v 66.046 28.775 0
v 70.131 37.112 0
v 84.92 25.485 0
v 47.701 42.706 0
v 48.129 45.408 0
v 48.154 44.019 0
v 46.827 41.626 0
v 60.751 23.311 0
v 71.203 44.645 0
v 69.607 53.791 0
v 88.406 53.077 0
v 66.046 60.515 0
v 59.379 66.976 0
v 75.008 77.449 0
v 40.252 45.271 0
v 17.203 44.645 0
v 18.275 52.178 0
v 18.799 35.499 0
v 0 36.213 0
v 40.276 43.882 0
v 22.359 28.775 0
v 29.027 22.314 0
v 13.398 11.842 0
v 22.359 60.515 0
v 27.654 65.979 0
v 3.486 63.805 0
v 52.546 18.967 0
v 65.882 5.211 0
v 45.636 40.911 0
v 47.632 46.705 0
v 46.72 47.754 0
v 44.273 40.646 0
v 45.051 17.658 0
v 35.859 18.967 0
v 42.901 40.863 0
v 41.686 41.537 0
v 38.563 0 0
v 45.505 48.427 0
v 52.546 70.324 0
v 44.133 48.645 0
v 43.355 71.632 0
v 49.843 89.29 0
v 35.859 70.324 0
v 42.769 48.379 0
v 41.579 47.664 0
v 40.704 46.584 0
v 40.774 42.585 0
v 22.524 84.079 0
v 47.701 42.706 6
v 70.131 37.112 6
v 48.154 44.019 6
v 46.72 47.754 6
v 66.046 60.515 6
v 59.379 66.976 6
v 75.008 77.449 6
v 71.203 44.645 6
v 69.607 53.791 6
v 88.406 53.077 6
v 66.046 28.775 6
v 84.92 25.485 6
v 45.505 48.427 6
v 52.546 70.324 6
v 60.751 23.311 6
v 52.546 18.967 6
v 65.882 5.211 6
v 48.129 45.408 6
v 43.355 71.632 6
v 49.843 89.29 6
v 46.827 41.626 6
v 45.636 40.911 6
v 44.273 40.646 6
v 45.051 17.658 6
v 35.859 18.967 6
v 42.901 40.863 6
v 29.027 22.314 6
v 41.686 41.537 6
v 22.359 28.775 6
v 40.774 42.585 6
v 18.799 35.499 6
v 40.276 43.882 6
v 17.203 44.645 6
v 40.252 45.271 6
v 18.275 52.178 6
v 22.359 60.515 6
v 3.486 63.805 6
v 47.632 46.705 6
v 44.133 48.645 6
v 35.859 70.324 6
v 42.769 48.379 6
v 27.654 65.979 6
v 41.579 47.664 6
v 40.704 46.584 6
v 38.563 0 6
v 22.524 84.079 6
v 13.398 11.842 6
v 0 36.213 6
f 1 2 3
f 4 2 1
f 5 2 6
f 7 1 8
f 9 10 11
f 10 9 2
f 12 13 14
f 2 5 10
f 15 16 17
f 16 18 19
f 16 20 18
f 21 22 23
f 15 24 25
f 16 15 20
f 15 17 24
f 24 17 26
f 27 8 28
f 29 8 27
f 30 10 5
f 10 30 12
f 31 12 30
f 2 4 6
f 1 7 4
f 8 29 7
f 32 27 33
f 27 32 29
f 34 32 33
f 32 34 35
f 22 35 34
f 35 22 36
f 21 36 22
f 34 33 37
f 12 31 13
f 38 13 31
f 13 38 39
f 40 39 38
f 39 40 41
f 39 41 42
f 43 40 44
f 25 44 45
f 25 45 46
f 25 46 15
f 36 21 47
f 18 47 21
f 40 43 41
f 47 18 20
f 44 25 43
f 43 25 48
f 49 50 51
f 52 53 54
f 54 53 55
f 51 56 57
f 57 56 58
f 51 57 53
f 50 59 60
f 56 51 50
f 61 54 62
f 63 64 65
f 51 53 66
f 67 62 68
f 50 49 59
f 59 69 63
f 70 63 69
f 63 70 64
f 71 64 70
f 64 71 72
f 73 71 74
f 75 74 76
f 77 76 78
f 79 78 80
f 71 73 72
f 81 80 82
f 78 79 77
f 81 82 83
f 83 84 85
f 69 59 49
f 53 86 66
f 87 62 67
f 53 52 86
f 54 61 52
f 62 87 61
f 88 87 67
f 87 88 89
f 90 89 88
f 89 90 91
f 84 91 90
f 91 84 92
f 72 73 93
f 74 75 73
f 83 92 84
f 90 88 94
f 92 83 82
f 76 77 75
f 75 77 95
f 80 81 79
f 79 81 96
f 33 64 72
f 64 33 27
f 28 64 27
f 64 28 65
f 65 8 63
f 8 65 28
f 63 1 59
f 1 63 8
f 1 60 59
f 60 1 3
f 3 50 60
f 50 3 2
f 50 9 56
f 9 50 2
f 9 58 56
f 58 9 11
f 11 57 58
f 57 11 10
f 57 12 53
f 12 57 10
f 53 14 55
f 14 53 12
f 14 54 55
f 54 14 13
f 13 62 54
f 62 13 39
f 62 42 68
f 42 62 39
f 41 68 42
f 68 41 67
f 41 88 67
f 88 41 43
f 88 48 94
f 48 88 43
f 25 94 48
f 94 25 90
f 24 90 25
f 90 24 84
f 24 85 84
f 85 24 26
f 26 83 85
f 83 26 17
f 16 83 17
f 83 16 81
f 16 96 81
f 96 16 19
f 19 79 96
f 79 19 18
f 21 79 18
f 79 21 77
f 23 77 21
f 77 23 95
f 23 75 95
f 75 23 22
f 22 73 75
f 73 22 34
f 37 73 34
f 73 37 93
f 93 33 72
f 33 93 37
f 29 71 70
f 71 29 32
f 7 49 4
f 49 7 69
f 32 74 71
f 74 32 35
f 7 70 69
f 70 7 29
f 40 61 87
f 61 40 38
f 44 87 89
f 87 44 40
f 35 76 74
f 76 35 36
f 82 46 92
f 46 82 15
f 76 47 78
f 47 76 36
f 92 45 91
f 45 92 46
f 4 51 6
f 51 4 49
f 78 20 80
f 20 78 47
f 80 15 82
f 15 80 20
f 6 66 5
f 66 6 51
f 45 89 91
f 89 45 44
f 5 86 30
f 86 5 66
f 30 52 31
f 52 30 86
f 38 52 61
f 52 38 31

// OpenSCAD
$fn = 32;

// ----------------------------------------------------------------------
// Star wheel: 10-point ratchet, R45
// ----------------------------------------------------------------------

// --- parameters (mm) ---
n_points = 10;            // number of points / teeth
r_out = 45;               // tip radius
r_in = 27;                // root radius
bore_r = 4;               // centre bore radius
plate_t = 6;              // plate thickness, Z (extrusion height)
bore_d = 8;               // centre bore diameter

profile = [[17.203, 44.645], [0, 36.213], [18.799, 35.499], [22.359, 28.775], [13.398, 11.842], [29.027, 22.314], [35.859, 18.967], [38.563, 0], [45.051, 17.658], [52.546, 18.967], [65.882, 5.211], [60.751, 23.311], [66.046, 28.775], [84.92, 25.485], [70.131, 37.112], [71.203, 44.645], [88.406, 53.077], [69.607, 53.791], [66.046, 60.515], [75.008, 77.449], [59.379, 66.976], [52.546, 70.324], [49.843, 89.29], [43.355, 71.632], [35.859, 70.324], [22.524, 84.079], [27.654, 65.979], [22.359, 60.515], [3.486, 63.805], [18.275, 52.178]];  // primary outline, 30 points, counter clockwise
void_1 = [[48.129, 45.408], [47.632, 46.705], [46.72, 47.754], [45.505, 48.427], [44.133, 48.645], [42.769, 48.379], [41.579, 47.664], [40.704, 46.584], [40.252, 45.271], [40.276, 43.882], [40.774, 42.585], [41.686, 41.537], [42.901, 40.863], [44.273, 40.646], [45.636, 40.911], [46.827, 41.626], [47.701, 42.706], [48.154, 44.019]];  // centre bore, 18 points

// --- the one profile operation ---
difference() {
  linear_extrude(height = plate_t) polygon(points = profile);
  translate([0, 0, -1])
    linear_extrude(height = plate_t + 2) polygon(points = void_1);
}
